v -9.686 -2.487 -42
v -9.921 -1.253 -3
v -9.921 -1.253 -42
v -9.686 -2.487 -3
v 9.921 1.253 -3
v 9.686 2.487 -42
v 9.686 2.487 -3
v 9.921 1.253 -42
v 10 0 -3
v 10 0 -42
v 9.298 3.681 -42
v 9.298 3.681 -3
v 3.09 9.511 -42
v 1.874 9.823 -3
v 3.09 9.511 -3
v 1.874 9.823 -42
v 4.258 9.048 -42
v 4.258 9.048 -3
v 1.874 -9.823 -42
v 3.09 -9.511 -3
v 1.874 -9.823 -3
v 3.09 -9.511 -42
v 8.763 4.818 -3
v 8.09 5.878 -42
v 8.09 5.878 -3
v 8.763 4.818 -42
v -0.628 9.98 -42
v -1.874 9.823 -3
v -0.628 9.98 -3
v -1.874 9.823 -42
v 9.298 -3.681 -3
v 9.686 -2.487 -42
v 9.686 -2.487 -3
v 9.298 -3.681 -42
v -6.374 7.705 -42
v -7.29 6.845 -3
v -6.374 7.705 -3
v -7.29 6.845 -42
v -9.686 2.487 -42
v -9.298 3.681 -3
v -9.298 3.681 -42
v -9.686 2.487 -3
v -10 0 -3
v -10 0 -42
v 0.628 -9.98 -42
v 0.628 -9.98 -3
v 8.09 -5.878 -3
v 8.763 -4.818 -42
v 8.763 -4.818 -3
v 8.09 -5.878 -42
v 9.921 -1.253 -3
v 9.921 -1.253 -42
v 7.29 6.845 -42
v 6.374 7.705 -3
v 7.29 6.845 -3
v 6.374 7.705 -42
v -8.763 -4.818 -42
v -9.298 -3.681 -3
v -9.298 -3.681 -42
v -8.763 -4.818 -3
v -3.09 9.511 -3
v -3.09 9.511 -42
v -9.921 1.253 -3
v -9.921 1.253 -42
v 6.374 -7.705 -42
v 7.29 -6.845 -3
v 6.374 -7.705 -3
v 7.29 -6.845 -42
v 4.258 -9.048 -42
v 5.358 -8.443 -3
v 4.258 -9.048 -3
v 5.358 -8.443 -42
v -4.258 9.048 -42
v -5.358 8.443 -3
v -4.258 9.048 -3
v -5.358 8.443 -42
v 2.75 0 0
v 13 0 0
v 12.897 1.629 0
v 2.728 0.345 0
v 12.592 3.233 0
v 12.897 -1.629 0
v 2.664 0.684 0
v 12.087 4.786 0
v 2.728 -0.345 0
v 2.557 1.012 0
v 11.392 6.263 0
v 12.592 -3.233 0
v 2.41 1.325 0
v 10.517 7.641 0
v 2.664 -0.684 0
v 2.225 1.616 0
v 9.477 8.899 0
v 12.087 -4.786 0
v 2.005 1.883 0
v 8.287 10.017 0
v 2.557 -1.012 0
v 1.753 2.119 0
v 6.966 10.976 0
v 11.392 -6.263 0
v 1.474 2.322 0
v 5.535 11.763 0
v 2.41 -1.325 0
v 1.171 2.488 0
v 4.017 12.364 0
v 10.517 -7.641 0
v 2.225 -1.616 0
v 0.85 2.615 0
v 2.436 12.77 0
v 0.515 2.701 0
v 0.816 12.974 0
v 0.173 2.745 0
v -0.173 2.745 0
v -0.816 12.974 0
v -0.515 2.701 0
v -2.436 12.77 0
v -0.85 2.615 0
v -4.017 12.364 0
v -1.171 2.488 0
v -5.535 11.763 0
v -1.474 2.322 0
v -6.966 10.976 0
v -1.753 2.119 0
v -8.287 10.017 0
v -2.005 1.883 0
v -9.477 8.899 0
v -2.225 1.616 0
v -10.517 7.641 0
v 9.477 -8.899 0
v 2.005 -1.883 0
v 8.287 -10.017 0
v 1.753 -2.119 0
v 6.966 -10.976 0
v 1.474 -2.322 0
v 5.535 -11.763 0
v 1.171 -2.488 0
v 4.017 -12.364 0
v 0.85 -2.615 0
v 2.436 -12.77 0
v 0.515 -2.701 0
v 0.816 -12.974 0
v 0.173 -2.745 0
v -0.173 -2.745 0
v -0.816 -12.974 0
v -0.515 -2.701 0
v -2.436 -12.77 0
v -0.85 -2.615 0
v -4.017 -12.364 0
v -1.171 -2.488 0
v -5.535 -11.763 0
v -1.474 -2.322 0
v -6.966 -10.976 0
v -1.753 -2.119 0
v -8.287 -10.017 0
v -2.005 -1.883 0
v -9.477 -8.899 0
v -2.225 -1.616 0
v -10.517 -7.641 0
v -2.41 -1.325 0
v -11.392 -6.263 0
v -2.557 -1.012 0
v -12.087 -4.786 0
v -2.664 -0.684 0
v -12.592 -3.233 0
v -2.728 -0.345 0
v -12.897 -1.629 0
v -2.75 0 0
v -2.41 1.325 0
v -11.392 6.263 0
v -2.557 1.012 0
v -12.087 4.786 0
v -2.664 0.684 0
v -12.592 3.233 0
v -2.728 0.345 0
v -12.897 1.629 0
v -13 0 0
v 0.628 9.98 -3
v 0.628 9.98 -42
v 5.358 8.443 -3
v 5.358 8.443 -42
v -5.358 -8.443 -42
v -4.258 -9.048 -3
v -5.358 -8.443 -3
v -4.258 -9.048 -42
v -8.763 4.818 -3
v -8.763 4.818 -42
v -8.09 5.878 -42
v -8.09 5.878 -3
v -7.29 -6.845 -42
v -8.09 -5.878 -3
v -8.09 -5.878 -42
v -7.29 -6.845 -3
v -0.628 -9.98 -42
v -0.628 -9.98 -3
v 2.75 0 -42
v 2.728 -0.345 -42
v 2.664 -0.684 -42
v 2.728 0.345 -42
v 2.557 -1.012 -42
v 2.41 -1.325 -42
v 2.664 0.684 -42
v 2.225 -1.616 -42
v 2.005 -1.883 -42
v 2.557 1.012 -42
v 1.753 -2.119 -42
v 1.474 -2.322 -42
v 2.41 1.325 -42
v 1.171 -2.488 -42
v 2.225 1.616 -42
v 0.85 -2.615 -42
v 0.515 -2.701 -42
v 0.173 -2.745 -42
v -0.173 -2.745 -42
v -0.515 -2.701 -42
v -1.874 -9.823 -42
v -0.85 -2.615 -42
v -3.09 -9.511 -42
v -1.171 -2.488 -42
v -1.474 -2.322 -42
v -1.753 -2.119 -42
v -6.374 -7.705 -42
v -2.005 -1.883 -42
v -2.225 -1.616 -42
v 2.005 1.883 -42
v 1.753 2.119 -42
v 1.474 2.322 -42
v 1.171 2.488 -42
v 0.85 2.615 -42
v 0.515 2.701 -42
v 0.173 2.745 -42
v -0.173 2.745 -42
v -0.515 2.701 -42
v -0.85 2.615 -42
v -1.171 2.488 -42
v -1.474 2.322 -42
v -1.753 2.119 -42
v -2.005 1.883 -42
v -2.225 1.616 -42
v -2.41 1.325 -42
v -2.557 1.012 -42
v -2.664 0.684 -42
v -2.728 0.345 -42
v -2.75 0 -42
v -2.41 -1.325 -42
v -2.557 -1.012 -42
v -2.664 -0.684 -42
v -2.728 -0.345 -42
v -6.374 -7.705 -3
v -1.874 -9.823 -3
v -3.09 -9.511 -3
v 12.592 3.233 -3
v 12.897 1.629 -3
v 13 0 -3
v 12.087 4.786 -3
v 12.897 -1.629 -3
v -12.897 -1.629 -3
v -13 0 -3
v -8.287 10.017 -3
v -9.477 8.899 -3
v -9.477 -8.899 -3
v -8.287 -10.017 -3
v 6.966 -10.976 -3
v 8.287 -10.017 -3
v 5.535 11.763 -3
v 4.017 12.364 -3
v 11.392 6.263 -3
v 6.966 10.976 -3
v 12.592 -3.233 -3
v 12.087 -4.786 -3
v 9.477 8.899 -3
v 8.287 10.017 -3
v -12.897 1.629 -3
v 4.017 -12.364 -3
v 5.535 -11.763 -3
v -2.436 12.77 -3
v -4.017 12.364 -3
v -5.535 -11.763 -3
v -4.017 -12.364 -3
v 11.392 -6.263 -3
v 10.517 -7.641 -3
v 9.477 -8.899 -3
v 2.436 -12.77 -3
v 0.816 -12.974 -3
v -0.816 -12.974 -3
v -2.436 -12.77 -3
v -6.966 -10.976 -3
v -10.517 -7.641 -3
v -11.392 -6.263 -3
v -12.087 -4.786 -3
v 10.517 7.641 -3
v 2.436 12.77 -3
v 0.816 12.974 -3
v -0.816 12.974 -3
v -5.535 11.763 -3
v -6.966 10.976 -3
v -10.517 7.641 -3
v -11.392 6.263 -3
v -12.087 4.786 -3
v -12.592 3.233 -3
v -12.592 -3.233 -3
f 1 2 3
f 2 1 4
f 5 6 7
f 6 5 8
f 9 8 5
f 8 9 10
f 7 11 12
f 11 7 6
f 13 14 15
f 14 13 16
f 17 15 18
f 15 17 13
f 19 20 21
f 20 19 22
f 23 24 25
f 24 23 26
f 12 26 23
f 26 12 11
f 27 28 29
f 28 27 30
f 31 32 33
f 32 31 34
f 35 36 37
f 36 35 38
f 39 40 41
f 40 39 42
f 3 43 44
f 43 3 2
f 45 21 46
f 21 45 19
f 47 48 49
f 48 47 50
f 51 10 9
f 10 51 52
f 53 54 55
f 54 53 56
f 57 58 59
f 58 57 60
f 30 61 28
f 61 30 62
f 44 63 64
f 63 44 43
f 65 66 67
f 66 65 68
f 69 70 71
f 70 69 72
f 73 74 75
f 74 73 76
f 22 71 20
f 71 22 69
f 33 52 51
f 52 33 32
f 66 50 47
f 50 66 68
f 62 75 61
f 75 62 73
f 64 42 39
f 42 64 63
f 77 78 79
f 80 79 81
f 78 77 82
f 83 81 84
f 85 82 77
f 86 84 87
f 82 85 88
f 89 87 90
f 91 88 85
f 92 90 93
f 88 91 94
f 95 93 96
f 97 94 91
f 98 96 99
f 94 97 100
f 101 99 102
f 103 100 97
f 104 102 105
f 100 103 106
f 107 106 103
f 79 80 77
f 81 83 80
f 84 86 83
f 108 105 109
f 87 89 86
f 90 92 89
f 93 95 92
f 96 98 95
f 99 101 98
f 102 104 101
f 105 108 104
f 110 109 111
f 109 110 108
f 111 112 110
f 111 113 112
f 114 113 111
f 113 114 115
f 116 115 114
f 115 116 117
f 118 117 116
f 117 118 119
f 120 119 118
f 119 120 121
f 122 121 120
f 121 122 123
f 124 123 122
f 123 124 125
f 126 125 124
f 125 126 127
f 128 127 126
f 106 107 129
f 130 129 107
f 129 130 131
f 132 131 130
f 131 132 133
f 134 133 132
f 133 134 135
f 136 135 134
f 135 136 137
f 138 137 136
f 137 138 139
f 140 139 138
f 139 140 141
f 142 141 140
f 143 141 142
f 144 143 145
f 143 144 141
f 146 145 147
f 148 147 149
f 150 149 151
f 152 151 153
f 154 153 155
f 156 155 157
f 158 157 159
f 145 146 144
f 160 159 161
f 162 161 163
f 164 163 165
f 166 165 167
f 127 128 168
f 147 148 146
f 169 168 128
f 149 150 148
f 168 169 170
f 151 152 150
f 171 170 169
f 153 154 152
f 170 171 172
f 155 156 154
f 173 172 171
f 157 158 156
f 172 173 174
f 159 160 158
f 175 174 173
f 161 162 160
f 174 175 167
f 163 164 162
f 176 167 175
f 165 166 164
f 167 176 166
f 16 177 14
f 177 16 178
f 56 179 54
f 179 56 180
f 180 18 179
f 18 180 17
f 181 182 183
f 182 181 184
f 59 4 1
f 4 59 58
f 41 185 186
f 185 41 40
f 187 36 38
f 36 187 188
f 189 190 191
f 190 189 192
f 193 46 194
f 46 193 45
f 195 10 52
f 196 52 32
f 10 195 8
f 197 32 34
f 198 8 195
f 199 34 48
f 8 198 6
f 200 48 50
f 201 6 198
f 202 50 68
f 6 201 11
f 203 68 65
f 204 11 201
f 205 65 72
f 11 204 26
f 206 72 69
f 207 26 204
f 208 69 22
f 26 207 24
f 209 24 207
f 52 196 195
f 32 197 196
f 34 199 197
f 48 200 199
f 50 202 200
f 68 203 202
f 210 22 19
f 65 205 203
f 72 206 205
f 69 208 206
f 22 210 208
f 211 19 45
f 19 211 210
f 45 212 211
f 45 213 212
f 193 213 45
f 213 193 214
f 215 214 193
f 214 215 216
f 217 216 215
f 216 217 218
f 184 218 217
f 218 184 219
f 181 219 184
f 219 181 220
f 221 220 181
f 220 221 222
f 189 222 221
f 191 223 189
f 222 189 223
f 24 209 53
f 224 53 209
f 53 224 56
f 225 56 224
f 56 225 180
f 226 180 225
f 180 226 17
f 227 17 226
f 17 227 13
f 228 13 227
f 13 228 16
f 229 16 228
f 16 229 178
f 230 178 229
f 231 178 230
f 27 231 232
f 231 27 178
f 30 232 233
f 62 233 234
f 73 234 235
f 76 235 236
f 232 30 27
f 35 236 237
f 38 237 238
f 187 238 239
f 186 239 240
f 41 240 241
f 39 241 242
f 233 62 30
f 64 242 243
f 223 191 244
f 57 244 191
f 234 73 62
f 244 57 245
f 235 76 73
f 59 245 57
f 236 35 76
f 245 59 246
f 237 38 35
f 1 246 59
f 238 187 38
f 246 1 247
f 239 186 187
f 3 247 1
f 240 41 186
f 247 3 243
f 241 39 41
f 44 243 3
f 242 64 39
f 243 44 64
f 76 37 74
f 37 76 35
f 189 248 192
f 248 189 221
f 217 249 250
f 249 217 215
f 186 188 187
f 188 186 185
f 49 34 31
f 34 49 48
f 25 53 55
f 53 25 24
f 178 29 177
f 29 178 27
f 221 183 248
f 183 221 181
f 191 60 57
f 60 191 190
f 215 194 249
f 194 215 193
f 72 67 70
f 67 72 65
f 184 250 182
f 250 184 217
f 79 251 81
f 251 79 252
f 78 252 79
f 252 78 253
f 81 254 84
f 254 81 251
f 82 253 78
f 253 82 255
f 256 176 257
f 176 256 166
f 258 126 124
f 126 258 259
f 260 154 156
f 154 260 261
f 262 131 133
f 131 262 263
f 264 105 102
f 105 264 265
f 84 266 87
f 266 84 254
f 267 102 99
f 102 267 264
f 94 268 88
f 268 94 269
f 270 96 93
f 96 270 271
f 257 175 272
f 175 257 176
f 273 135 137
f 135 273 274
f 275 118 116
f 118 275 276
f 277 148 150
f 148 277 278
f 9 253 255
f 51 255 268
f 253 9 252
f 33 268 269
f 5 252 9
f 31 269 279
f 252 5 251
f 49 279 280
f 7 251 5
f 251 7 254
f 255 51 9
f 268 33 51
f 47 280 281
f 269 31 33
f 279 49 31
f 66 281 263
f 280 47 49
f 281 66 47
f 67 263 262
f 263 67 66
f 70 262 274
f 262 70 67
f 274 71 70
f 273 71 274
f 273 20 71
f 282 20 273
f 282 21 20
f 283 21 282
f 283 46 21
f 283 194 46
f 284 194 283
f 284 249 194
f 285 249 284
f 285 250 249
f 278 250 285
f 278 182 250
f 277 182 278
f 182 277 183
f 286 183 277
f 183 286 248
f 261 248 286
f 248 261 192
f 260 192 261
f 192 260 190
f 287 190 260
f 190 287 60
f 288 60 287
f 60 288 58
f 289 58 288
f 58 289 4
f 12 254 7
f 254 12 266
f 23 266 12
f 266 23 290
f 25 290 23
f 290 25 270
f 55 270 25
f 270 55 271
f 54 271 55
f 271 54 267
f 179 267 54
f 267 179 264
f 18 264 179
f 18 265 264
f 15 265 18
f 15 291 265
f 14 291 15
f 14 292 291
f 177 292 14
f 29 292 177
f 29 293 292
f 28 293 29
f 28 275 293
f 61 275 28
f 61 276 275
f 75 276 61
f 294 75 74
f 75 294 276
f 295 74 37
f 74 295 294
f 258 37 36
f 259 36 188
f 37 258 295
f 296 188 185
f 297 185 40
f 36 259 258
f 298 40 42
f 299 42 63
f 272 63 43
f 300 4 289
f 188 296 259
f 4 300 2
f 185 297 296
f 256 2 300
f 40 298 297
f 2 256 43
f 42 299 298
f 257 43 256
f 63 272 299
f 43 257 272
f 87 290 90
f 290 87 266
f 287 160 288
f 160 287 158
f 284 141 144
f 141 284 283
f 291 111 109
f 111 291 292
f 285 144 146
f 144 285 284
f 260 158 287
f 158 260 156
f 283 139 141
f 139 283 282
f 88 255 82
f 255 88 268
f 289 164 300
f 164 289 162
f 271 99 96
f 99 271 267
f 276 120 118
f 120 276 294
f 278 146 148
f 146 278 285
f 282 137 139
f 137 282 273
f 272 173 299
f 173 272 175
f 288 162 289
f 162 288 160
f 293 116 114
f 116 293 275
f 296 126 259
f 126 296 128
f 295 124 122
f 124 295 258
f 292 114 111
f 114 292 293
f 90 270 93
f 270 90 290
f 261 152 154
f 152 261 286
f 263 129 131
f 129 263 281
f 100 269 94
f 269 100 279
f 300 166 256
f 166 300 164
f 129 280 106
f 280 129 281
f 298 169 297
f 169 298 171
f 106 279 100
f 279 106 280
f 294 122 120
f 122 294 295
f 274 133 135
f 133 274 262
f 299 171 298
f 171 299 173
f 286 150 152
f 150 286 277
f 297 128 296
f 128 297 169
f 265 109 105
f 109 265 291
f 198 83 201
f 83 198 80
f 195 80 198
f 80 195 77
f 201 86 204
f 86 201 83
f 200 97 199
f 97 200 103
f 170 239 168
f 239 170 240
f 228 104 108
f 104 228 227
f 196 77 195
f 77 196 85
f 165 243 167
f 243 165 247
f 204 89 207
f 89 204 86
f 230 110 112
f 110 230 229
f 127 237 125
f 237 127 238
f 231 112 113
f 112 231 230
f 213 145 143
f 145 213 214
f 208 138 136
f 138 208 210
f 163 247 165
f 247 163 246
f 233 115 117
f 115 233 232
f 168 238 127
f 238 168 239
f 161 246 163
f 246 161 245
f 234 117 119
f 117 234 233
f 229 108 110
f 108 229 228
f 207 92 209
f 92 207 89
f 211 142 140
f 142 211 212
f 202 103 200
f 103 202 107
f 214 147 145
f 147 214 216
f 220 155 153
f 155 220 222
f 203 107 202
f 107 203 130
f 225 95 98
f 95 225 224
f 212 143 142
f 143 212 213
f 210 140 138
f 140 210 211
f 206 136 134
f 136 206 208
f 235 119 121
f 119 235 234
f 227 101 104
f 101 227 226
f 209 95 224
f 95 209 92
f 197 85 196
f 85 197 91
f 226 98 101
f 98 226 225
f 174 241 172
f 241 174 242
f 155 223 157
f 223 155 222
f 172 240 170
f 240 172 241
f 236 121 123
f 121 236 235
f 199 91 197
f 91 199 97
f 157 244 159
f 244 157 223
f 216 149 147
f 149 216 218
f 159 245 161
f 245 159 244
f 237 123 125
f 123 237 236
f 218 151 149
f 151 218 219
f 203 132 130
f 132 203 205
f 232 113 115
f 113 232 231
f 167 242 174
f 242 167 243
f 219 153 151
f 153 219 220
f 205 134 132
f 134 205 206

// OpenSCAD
$fn = 50;


difference() {
	union() {
		translate(v = [0, 0, -42.0000000000]) {
			cylinder(h = 42, r = 10.0000000000);
		}
		translate(v = [0, 0, -3.0000000000]) {
			cylinder(h = 3, r = 13.0000000000);
		}
	}
	union() {
		#translate(v = [0, 0, -42]) {
			cylinder(h = 42, r = 2.7500000000);
		}
	}
}
